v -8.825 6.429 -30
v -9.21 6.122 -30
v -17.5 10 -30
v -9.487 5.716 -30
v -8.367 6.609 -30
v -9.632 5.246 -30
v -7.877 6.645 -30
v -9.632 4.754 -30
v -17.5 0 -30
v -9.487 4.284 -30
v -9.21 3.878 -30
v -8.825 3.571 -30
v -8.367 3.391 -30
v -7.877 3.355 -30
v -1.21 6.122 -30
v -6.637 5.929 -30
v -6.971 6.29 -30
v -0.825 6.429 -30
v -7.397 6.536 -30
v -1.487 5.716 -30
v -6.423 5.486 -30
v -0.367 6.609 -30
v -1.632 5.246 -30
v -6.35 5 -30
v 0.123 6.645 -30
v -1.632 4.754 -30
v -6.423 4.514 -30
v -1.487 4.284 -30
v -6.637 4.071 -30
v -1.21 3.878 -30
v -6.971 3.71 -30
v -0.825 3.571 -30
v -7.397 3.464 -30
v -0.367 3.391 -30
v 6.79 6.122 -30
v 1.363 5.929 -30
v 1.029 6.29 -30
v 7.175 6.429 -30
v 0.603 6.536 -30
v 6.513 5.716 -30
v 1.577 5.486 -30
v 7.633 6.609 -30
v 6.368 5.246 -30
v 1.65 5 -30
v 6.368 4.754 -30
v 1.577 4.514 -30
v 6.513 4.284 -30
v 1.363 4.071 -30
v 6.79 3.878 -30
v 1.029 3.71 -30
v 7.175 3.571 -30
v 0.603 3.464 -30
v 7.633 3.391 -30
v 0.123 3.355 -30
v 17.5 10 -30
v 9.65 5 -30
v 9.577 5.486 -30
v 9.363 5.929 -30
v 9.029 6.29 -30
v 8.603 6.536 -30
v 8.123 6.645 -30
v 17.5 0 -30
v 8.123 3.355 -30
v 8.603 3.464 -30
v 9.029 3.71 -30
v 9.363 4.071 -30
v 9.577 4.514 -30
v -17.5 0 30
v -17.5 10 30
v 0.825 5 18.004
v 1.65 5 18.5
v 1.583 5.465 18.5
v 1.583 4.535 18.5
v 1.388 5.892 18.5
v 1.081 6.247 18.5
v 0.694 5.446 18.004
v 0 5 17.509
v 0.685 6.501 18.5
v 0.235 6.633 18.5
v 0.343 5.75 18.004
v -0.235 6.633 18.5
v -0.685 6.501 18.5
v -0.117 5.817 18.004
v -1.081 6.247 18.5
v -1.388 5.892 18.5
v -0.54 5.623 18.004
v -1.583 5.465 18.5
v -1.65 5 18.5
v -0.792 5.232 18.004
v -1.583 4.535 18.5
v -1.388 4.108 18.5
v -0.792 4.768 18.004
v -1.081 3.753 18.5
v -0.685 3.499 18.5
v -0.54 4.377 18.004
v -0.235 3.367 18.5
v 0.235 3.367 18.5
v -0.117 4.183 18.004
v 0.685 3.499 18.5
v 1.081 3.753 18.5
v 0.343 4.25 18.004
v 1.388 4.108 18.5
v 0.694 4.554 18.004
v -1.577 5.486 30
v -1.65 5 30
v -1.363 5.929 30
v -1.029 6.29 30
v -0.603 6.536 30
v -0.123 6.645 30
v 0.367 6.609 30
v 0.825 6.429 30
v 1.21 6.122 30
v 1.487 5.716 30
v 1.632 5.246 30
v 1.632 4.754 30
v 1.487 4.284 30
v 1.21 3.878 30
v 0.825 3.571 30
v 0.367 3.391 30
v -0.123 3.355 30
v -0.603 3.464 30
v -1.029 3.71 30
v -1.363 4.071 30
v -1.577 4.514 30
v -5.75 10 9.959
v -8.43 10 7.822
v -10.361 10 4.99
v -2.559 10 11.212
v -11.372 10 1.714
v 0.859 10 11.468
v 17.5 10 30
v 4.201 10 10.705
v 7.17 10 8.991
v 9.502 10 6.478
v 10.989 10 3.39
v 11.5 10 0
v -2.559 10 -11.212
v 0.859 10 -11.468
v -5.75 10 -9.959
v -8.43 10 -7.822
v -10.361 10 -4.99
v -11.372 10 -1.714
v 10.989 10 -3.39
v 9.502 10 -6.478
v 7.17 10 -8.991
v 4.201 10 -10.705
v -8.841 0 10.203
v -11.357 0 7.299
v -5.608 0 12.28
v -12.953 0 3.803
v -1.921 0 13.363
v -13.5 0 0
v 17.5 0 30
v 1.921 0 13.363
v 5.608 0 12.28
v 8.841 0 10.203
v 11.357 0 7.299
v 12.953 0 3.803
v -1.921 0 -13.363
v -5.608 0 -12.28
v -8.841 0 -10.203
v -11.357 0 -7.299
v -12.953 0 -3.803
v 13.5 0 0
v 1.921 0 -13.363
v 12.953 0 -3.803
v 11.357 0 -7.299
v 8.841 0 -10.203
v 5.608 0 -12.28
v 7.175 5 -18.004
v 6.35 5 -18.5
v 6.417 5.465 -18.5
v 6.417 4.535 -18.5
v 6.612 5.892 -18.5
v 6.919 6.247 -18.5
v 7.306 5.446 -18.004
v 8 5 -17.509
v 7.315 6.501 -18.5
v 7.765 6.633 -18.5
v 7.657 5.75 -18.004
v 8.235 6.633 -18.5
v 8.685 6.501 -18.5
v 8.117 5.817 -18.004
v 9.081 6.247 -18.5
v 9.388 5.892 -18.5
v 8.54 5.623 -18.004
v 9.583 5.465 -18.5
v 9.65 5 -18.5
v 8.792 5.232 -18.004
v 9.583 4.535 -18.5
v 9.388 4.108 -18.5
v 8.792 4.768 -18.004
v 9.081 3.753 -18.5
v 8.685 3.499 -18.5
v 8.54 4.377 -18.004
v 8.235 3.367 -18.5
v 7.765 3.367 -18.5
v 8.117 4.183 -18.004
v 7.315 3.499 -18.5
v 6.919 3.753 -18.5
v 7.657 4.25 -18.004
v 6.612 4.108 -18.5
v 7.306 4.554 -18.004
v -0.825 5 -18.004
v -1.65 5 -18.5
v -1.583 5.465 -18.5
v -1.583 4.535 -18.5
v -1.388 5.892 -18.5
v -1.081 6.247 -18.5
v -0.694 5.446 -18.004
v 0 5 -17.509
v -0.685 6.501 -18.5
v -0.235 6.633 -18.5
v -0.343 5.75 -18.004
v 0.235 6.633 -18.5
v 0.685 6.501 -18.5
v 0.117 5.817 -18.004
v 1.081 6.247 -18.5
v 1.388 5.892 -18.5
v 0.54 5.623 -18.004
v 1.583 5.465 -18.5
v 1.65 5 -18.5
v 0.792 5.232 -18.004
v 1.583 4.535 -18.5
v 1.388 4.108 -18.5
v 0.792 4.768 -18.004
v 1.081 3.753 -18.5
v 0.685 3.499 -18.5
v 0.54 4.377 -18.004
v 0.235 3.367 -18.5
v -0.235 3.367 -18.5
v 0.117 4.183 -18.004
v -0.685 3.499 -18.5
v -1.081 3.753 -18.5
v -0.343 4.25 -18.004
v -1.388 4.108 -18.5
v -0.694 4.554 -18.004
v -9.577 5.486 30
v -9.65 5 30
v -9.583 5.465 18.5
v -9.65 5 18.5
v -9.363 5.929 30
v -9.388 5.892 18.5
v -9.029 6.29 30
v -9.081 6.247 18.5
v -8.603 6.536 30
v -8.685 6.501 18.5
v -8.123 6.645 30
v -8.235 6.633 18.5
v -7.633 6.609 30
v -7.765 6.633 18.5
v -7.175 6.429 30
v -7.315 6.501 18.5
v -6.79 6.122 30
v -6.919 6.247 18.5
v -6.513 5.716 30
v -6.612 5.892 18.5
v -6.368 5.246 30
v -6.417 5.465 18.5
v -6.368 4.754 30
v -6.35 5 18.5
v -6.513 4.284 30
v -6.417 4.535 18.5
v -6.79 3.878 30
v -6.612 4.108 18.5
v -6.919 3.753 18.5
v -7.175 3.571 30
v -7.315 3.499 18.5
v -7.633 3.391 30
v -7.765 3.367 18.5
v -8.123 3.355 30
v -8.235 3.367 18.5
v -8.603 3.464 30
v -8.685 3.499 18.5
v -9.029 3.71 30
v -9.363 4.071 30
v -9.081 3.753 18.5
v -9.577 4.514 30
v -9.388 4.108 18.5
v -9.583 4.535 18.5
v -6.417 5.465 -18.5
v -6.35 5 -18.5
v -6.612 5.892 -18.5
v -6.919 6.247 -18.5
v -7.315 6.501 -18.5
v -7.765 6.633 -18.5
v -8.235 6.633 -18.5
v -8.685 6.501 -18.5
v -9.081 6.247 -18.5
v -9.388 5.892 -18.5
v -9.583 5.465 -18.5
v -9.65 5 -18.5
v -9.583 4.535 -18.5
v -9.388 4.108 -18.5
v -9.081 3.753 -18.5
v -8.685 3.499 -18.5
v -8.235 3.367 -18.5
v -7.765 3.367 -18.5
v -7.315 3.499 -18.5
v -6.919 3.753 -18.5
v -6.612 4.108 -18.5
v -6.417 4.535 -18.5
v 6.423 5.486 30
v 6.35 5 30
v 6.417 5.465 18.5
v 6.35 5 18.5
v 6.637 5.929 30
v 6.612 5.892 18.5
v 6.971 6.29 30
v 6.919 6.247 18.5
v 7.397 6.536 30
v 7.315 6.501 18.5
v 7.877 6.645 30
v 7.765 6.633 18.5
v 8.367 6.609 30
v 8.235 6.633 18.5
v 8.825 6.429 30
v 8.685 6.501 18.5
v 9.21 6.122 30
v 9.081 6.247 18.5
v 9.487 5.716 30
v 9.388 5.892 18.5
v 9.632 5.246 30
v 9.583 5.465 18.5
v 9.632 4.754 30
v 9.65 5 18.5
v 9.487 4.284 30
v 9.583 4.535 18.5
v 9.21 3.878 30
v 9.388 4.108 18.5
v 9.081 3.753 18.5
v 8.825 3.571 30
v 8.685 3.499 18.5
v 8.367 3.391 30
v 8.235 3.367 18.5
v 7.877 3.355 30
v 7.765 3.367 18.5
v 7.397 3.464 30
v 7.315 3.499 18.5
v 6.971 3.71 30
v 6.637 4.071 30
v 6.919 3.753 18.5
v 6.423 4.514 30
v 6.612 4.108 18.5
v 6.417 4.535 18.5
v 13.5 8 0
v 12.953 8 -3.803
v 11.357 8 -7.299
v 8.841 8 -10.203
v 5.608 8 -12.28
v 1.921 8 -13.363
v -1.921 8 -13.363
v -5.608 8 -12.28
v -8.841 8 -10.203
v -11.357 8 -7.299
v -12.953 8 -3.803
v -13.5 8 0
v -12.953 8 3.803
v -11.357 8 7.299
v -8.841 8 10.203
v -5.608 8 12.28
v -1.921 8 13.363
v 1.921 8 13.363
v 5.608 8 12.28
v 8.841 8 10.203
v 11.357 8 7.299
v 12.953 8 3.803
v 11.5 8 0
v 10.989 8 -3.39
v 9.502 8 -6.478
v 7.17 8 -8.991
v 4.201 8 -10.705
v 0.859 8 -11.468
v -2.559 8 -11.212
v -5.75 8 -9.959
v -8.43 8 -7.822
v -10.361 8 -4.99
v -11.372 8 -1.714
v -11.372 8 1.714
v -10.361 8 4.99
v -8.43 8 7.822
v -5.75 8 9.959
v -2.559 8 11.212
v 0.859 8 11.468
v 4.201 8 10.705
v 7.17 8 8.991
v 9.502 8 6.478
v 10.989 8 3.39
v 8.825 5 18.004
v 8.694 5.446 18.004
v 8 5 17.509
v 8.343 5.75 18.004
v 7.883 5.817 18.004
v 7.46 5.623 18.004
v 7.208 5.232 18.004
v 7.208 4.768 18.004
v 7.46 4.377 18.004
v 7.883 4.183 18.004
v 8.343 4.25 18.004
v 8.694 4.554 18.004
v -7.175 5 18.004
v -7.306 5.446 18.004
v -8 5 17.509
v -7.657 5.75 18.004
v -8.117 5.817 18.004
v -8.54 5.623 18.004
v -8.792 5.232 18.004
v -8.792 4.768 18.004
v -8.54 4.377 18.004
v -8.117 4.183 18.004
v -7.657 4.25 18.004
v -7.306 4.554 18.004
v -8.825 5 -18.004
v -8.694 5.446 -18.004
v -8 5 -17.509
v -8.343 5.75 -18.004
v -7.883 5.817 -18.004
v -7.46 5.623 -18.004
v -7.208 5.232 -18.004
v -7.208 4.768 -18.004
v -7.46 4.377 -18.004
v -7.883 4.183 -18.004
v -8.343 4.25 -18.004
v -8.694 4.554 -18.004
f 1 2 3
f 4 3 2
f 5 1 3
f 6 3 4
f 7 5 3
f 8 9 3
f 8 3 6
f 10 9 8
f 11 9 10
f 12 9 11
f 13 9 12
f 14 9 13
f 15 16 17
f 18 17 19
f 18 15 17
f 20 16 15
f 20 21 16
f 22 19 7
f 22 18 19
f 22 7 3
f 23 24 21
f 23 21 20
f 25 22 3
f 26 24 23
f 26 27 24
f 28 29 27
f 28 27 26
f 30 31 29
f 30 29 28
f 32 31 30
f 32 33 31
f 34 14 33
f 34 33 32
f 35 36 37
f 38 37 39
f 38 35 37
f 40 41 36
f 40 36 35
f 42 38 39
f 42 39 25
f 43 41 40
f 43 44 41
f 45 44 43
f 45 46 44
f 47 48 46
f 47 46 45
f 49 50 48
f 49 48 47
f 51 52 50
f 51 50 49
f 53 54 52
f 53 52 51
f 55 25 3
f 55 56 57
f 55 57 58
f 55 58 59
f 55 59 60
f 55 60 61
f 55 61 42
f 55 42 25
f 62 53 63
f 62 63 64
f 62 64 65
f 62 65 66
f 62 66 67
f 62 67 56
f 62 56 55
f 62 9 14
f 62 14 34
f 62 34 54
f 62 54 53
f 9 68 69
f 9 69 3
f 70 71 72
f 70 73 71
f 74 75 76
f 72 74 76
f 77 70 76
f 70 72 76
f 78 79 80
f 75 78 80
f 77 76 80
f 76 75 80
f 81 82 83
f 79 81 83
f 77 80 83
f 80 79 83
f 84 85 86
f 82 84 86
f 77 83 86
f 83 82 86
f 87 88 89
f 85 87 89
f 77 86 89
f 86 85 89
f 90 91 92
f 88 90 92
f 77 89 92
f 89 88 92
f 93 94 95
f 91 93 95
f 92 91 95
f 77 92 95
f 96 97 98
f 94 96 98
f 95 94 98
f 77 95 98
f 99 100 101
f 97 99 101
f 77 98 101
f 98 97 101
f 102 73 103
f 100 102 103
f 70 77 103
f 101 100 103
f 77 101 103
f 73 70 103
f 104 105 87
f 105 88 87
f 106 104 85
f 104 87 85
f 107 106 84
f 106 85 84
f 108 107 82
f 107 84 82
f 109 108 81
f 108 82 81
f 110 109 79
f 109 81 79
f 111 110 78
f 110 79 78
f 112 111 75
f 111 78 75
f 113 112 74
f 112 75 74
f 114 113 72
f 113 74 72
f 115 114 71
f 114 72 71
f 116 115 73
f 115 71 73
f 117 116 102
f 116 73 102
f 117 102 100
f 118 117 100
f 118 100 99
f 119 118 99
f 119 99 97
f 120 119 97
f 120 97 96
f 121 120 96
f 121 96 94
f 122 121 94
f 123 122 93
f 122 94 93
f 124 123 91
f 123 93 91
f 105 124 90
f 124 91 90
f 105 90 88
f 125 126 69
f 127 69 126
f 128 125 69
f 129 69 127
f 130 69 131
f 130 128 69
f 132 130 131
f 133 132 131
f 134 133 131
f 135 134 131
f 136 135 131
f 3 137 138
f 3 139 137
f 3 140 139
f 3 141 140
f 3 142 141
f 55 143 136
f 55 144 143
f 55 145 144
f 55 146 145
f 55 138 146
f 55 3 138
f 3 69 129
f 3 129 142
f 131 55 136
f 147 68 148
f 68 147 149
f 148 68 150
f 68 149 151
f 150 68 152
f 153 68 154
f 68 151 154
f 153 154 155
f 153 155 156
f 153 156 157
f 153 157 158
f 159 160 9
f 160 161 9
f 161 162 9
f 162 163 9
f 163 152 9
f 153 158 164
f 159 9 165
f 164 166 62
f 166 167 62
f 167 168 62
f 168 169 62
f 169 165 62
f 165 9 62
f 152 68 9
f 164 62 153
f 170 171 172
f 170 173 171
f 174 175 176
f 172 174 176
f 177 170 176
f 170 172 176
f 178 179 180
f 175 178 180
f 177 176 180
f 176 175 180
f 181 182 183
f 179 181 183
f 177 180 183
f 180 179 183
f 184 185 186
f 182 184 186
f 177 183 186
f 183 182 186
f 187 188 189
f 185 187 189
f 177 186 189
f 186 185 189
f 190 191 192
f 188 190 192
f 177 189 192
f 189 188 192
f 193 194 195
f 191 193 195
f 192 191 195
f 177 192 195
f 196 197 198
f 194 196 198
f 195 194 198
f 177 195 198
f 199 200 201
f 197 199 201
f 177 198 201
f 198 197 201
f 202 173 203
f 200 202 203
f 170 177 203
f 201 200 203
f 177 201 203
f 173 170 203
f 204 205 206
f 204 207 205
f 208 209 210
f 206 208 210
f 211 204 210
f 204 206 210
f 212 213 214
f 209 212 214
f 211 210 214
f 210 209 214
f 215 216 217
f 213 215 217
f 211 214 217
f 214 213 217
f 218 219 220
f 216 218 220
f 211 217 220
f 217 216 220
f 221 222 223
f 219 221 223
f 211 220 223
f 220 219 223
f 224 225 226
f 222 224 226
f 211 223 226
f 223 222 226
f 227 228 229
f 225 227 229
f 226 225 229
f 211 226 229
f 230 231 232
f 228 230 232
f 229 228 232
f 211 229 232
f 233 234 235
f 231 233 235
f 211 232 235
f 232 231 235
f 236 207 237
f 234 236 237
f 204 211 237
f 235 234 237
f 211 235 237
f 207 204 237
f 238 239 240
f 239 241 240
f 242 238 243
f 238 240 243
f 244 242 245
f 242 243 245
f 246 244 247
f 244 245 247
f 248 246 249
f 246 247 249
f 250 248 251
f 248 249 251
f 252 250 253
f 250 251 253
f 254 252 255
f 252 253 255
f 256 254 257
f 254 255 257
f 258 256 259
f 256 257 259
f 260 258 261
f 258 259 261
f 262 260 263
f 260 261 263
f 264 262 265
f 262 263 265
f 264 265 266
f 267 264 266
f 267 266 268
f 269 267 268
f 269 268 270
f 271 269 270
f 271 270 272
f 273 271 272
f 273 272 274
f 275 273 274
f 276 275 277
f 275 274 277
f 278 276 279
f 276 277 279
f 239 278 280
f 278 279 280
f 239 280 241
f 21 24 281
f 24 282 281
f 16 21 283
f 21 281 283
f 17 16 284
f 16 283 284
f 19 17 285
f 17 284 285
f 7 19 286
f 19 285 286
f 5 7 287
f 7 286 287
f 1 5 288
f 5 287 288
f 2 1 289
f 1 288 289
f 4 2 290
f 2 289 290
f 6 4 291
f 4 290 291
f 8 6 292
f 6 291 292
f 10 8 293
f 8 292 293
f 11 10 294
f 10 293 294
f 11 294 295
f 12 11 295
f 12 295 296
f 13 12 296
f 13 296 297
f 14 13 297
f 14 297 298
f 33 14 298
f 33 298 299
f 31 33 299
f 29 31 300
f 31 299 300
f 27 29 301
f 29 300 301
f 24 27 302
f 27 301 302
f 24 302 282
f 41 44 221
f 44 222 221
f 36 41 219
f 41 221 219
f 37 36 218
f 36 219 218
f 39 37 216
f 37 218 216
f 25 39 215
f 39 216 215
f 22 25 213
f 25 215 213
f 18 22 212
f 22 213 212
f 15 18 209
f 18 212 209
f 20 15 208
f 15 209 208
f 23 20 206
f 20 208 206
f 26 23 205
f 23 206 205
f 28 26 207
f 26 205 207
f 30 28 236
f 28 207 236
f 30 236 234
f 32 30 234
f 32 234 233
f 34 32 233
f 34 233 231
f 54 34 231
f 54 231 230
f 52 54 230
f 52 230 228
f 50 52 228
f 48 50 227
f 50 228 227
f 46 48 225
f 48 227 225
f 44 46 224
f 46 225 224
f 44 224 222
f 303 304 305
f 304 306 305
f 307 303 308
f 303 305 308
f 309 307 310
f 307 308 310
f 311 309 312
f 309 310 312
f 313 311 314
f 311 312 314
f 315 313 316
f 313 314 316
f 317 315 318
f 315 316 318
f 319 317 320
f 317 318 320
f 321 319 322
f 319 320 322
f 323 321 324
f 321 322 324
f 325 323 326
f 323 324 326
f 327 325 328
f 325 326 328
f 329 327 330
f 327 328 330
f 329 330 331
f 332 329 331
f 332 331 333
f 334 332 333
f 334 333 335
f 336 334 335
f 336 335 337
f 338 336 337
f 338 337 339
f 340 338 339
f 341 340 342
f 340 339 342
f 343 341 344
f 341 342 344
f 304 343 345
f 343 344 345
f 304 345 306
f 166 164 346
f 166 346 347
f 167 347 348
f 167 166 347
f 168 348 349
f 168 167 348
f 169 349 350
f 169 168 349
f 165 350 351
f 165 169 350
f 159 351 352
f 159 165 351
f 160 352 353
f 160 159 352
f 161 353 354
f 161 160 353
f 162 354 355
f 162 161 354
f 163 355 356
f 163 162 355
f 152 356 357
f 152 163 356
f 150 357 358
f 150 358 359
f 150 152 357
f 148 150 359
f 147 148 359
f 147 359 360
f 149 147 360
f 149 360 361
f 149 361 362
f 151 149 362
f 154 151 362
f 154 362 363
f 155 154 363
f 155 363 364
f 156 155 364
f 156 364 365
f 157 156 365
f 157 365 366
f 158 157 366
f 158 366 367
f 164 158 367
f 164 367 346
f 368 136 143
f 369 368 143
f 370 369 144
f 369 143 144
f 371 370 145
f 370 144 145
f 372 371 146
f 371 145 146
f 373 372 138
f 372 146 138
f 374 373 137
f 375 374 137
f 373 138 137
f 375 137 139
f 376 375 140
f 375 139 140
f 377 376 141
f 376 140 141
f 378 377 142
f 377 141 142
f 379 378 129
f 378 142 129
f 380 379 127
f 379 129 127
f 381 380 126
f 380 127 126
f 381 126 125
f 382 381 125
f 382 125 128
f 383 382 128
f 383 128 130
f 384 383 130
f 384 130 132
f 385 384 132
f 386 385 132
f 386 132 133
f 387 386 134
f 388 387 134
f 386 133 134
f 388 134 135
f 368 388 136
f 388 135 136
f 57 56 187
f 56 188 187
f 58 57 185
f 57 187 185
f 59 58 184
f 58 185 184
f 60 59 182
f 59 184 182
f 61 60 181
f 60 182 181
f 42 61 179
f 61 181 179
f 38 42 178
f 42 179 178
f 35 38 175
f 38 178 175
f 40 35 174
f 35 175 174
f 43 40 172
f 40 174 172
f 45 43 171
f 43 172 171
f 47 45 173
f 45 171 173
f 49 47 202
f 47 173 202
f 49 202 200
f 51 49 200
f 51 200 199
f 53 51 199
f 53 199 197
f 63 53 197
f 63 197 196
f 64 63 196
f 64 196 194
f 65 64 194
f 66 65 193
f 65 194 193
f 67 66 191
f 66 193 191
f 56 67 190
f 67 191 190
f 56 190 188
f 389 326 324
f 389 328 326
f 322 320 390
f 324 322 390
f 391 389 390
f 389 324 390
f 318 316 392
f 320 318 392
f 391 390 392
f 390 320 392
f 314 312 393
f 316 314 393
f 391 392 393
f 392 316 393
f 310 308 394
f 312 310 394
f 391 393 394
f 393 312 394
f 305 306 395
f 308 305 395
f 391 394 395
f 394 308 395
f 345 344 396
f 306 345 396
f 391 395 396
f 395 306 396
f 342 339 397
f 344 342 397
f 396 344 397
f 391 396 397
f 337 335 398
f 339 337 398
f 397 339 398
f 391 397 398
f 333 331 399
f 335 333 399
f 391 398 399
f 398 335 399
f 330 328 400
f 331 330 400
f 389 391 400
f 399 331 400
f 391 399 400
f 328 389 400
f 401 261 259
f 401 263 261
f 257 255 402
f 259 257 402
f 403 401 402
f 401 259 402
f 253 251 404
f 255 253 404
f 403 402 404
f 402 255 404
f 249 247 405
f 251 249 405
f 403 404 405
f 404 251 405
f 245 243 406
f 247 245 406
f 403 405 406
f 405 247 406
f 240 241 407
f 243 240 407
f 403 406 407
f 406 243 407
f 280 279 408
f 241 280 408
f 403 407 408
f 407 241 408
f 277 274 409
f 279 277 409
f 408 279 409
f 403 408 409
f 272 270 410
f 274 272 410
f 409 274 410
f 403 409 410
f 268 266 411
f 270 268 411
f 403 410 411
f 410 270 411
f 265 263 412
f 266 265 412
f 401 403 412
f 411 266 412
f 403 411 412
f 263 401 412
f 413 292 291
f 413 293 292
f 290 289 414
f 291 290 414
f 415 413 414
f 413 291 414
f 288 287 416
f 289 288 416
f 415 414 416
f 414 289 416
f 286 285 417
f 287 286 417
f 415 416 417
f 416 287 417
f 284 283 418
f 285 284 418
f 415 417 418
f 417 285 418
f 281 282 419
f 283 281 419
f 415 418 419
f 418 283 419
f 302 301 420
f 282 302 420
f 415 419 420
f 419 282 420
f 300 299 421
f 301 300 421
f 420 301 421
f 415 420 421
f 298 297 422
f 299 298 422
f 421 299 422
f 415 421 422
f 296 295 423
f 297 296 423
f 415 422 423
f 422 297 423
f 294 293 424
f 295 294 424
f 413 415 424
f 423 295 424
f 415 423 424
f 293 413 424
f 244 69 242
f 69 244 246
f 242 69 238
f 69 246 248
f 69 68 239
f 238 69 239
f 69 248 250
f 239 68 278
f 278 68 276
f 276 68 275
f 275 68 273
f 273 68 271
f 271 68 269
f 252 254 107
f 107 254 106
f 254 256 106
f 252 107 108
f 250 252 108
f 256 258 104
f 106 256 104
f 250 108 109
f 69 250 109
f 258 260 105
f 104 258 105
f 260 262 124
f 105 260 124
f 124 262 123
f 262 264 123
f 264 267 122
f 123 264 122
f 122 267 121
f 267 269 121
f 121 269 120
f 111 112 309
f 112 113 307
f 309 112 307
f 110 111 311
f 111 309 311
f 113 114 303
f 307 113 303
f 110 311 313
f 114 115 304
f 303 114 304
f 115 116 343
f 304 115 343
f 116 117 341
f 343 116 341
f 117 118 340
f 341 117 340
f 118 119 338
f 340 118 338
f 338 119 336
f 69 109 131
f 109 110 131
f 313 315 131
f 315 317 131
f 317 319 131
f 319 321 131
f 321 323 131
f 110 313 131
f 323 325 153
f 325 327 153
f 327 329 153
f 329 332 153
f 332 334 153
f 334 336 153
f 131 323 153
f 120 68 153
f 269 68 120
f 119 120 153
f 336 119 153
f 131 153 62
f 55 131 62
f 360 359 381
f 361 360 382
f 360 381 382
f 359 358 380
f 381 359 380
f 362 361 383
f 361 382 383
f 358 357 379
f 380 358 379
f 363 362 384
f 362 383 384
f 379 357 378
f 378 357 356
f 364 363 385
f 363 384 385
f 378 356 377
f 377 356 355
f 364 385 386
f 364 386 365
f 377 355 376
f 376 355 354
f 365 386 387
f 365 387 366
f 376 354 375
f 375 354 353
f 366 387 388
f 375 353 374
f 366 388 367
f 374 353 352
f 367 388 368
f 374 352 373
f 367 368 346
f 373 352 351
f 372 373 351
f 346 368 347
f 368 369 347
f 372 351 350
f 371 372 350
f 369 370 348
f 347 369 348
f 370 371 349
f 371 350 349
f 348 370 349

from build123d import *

# Parameters (mm, degrees)
SKETCH_1_W             = 35
SKETCH_1_H             = 60
SKETCH_1_R             = 13.5
EXTRUDE_1_DEPTH        = 10
SKETCH_3_R             = 13.5
SKETCH_3_R_2           = 11.5
EXTRUDE_2_DEPTH        = 2
HOLE_WIZARD_M4_2_D     = 3.3
HOLE_WIZARD_M4_2_DEPTH = 11.5
HOLE_WIZARD_M4_2_TIP   = 0.991420021
HOLE_WIZARD_M4_3_D     = 3.3
HOLE_WIZARD_M4_3_DEPTH = 11.5
HOLE_WIZARD_M4_3_TIP   = 0.991420021


with BuildPart() as part:
    # 스케치1 → 보스-돌출1 (new body)
    with BuildSketch(Plane(origin=(0, 0, 0), x_dir=(1, 0, 0), z_dir=(0, 1, 0))):
        Rectangle(SKETCH_1_W, SKETCH_1_H)
        Circle(SKETCH_1_R, mode=Mode.SUBTRACT)
    extrude(amount=EXTRUDE_1_DEPTH)

    # 스케치3 → 보스-돌출2 (add)
    with BuildSketch(Plane(origin=(0, 10, 0), x_dir=(1, 0, 0), z_dir=(0, 1, 0))):
        Circle(SKETCH_3_R)
        Circle(SKETCH_3_R_2, mode=Mode.SUBTRACT)
    extrude(amount=-EXTRUDE_2_DEPTH)

    # M4 나사 구멍2
    with Locations(Plane.XY.offset(30)):
        with Locations((-8, 5), (0, 5), (8, 5)):
            Hole(HOLE_WIZARD_M4_2_D / 2, depth=HOLE_WIZARD_M4_2_DEPTH)
            with Locations((0, 0, -(HOLE_WIZARD_M4_2_DEPTH + HOLE_WIZARD_M4_2_TIP / 2))):  # 118° drill point
                Cone(0, HOLE_WIZARD_M4_2_D / 2, HOLE_WIZARD_M4_2_TIP, mode=Mode.SUBTRACT)

    # M4 나사 구멍3
    with Locations(Plane(origin=(0, 0, -30), x_dir=(-1, 0, 0), z_dir=(0, 0, -1))):
        with Locations((-8, 5), (0, 5), (8, 5)):
            Hole(HOLE_WIZARD_M4_3_D / 2, depth=HOLE_WIZARD_M4_3_DEPTH)
            with Locations((0, 0, -(HOLE_WIZARD_M4_3_DEPTH + HOLE_WIZARD_M4_3_TIP / 2))):  # 118° drill point
                Cone(0, HOLE_WIZARD_M4_3_D / 2, HOLE_WIZARD_M4_3_TIP, mode=Mode.SUBTRACT)


solid = part.part
